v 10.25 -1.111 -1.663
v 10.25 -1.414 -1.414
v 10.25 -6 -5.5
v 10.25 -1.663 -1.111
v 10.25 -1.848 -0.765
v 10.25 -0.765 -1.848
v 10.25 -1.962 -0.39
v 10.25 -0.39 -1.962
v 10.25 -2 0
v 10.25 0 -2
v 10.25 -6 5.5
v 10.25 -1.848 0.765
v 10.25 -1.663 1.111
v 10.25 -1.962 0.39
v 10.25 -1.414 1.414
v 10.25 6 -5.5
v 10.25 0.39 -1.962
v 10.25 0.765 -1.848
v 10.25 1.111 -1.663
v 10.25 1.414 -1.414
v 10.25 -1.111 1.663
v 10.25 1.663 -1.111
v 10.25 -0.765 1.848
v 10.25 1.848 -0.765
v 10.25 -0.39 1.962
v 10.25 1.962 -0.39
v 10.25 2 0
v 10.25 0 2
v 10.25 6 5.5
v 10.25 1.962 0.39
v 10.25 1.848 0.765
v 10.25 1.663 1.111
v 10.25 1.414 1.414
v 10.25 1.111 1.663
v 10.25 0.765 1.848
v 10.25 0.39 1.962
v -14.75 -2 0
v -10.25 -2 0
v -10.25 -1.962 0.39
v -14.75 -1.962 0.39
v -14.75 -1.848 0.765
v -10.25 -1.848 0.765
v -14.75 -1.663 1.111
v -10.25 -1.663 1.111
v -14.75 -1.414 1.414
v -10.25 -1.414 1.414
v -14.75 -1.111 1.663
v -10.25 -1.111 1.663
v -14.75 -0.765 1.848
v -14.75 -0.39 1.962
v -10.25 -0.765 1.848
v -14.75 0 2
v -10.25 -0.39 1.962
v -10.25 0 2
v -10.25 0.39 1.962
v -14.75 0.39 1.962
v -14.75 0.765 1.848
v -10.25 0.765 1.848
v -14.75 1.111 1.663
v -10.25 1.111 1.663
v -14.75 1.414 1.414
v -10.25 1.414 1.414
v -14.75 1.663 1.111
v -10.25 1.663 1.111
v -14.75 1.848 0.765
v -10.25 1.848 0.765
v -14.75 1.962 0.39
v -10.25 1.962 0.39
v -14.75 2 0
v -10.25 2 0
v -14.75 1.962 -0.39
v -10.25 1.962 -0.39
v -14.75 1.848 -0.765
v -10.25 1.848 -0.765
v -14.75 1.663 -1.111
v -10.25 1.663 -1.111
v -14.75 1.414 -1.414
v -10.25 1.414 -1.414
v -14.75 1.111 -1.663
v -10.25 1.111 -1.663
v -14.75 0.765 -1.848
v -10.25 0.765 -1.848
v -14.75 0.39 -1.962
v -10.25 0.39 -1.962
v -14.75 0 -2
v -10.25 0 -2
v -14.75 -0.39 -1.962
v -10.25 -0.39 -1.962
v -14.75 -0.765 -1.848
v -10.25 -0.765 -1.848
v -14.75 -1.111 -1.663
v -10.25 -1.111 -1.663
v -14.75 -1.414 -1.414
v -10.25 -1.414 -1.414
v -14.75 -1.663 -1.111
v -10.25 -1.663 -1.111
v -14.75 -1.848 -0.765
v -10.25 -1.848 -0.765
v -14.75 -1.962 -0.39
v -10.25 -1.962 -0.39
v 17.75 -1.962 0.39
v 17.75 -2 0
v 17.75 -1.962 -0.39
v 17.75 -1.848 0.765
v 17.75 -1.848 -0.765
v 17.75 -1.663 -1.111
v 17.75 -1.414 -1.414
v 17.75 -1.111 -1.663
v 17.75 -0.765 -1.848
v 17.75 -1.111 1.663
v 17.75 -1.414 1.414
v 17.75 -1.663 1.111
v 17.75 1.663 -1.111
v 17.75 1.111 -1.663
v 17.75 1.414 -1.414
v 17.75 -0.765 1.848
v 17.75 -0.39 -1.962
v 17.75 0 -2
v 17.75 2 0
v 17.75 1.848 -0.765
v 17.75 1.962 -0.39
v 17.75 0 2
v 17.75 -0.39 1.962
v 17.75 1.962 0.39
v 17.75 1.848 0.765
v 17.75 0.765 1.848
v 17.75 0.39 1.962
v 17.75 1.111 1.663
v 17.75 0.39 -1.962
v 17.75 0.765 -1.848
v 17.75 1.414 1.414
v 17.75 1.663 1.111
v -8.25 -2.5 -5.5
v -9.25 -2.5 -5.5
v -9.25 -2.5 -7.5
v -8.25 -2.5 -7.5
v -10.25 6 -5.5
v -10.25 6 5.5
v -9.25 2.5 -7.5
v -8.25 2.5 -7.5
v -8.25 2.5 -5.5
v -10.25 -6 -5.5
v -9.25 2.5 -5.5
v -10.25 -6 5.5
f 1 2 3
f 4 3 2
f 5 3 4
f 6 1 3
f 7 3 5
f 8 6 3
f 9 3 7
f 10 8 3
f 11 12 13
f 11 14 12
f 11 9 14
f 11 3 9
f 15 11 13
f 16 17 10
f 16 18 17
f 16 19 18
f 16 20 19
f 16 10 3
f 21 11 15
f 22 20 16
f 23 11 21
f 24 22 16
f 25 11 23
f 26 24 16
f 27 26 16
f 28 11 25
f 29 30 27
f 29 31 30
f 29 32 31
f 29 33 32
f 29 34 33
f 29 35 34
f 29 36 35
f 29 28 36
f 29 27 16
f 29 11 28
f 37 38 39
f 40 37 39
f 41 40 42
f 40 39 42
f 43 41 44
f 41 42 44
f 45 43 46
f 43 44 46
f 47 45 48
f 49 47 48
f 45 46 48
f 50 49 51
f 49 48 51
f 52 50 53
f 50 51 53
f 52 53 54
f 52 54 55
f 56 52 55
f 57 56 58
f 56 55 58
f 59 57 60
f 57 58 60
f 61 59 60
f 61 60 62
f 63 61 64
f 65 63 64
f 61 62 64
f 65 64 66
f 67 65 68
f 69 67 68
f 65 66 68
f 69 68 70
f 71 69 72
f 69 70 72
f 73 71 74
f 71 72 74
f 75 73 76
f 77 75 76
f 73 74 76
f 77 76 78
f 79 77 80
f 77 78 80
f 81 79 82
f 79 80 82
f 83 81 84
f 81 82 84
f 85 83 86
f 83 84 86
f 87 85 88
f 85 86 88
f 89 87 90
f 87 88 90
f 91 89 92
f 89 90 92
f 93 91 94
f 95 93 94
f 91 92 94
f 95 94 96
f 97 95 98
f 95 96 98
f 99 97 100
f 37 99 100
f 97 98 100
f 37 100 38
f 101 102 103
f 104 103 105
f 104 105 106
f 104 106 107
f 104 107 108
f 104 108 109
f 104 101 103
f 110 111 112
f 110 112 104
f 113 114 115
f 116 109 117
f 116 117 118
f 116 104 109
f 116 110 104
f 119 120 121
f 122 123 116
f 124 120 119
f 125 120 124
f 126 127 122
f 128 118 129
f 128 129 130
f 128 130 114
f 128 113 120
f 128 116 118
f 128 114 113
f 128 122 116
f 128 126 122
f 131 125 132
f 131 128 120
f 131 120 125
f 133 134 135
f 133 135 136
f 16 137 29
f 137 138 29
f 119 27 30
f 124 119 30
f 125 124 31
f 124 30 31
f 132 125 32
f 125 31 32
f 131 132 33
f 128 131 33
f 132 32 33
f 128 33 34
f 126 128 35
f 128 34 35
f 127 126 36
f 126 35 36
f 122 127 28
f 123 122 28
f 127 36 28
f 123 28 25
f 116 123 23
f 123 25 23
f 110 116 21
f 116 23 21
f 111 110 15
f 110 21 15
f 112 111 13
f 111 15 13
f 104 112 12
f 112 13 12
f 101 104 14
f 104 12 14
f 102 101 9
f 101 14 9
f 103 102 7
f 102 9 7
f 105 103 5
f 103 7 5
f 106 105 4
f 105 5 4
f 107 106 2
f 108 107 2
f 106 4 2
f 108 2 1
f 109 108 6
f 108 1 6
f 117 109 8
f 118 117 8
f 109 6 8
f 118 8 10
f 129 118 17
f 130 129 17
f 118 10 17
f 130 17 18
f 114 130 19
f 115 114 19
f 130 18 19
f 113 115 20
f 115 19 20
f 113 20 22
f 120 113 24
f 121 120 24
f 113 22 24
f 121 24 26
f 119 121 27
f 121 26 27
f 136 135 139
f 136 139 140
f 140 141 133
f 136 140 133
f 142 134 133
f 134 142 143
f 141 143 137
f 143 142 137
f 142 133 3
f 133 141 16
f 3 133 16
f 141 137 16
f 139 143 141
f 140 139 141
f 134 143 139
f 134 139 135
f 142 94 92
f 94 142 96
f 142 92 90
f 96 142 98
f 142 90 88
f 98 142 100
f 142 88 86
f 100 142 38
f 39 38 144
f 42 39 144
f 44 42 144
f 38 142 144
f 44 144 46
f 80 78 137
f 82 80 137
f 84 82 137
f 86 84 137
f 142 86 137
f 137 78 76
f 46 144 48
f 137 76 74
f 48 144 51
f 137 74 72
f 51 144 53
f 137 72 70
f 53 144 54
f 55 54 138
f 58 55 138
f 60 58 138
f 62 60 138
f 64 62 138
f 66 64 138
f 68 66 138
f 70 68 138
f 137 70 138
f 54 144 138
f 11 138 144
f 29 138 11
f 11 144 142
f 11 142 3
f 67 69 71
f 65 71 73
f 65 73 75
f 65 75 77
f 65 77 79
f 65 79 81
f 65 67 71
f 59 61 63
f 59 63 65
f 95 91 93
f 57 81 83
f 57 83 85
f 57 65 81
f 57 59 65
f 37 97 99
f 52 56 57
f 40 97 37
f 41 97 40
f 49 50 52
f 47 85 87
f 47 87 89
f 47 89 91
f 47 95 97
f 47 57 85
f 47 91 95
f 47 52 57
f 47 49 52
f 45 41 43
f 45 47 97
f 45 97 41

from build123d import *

# Parameters (mm, degrees)
F0_W          = 20.5
F0_H          = 12
F1_DEPTH      = 5.5
F1_DEPTH_BACK = 5.5
F2_R          = 2
F3_DEPTH      = 4.5
F4_R          = 2
F5_DEPTH      = 7.5
F6_W          = 1
F6_H          = 5
F7_DEPTH      = 2


with BuildPart() as f1:
    # F0 (on Top) → F1 (new body, two sides)
    with BuildSketch(Plane.XY) as f1_sk:
        Rectangle(F0_W, F0_H)
    extrude(amount=F1_DEPTH)
    extrude(f1_sk.sketch, amount=-F1_DEPTH_BACK)

    # F2 (on face) → F3 (join)
    with BuildSketch(Plane(origin=(-10.25, 0, 0), x_dir=(0, -1, 0), z_dir=(-1, 0, 0))):
        Circle(F2_R)
    extrude(amount=F3_DEPTH)

    # F4 (on face) → F5 (join)
    with BuildSketch(Plane.YZ.offset(10.25)):
        Circle(F4_R)
    extrude(amount=F5_DEPTH)

    # F6 (on face) → F7 (join)
    with BuildSketch(Plane(origin=(0, 0, -5.5), x_dir=(1, 0, 0), z_dir=(0, 0, -1))):
        with Locations((-8.75, 0)):
            Rectangle(F6_W, F6_H)
    extrude(amount=F7_DEPTH)


solid = f1.part
